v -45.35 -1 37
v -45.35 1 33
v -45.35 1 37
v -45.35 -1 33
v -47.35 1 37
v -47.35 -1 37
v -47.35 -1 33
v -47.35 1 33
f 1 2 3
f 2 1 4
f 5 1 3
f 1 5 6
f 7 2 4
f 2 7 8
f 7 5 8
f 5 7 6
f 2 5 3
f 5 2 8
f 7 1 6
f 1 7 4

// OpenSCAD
// Zip-tie tab on the holder's far (-x upright, world -Y) end: the bridge
// between its two slots, where the lead lies, must be material.
// Must render non-empty.
include <../lib.scad>
intersection() {
  mg995_holder();
  translate([holder_px0 - tie_tab_l / 2 - 1, -1, servo_ear_top + 1]) cube([2, 2, holder_t - 2]);
}
